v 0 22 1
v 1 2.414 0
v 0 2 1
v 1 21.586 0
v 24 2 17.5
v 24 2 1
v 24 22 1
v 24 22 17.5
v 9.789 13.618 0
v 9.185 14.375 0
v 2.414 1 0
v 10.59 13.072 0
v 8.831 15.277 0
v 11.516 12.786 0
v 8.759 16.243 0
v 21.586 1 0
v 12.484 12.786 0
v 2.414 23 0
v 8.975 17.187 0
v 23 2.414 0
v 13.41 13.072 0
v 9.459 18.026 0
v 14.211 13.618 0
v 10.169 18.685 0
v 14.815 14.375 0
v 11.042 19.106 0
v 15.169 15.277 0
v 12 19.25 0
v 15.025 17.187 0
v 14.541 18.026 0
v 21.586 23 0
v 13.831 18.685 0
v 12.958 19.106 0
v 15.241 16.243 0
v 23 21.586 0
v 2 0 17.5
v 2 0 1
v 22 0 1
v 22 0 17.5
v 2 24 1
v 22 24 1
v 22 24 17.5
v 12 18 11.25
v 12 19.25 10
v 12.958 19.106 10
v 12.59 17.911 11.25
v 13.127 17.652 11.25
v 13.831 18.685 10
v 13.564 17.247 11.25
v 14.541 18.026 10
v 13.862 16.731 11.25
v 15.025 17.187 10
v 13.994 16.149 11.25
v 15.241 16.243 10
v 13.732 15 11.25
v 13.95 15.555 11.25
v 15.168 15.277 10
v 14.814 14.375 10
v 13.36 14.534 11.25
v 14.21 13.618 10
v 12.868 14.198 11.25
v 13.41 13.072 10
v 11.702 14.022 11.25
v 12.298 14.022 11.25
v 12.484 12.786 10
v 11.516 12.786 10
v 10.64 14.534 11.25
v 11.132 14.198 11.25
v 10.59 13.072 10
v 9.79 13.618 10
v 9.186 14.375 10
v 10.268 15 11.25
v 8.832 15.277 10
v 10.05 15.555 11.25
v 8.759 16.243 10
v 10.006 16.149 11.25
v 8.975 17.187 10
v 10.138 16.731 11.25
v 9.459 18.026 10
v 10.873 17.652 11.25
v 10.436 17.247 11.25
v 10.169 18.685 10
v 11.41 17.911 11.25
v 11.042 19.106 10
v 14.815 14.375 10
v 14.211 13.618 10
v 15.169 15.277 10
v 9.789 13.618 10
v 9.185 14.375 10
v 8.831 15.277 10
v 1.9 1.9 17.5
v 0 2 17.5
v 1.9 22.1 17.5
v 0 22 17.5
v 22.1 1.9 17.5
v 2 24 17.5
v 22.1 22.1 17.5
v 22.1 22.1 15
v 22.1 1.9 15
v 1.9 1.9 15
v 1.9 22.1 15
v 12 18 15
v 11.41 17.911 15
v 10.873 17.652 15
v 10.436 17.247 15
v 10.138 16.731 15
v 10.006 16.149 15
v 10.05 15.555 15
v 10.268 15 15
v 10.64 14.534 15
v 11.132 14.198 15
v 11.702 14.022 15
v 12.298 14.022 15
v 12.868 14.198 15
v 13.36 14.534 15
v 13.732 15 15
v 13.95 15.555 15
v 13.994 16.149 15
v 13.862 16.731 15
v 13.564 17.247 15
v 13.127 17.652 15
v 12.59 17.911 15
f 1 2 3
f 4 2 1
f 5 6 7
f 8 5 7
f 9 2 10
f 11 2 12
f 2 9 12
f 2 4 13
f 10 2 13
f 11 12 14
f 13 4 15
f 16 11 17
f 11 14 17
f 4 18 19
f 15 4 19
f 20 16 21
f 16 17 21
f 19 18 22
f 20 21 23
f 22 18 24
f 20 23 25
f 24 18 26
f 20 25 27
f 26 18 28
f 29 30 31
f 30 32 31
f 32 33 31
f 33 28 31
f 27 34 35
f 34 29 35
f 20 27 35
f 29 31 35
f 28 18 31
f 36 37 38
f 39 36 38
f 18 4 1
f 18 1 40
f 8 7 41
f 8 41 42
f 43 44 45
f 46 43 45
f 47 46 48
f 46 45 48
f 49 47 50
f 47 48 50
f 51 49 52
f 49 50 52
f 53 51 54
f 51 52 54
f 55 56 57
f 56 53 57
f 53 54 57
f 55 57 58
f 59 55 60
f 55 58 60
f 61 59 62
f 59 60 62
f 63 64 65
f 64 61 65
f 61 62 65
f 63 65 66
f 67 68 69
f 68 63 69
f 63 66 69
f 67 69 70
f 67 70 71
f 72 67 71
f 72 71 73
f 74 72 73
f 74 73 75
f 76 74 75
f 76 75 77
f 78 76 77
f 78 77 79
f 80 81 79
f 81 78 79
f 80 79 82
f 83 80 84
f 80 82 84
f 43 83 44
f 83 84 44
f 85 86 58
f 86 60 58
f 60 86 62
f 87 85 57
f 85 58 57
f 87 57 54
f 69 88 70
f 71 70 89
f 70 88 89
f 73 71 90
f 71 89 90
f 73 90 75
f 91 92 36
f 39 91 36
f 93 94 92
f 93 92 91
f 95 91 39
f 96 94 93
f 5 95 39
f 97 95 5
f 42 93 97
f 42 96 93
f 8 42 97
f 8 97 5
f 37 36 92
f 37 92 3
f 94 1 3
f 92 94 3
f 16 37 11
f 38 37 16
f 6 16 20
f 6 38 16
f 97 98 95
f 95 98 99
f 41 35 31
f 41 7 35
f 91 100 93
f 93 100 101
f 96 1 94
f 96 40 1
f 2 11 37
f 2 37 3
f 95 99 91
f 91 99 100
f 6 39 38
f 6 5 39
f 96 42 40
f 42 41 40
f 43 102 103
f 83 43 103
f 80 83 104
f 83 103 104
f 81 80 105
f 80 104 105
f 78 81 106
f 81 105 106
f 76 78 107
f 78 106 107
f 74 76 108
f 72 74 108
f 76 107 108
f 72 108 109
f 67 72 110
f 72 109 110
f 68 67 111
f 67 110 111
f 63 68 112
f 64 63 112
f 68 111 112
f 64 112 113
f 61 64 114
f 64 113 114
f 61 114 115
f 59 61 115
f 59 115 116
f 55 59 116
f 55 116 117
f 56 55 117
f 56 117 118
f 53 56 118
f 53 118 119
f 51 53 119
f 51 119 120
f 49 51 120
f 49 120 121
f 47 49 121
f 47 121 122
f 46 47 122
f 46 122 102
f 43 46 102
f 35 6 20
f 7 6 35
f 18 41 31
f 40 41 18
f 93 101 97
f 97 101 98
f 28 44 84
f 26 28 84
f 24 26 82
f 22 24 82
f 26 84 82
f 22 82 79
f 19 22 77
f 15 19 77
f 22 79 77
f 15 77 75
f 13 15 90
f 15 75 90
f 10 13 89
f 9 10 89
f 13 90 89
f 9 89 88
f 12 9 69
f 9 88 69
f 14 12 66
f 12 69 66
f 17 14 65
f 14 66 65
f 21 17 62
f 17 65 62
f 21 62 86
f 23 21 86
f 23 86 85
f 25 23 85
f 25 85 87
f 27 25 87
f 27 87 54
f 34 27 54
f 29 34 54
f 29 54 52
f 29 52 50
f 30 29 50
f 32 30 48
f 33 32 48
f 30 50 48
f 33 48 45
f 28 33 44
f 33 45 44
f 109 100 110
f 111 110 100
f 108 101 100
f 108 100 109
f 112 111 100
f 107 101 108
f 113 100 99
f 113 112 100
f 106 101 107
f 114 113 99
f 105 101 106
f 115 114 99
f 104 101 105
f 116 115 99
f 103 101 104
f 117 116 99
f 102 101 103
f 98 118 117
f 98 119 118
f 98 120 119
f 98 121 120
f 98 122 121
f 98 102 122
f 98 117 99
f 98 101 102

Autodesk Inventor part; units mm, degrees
ref_plane "YZ Plane" through (0, 0, 0) normal (1, 0, 0) x (0, 1, 0)
ref_plane "XZ Plane" through (0, 0, 0) normal (0, 1, 0) x (-1, 0, 0)
ref_plane "XY Plane" through (0, 0, 0) normal (0, 0, 1) x (1, 0, 0)
sketch "Sketch1" plane through (0, 0, 0) normal (0, 0, 1) x (1, 0, 0)
  line L0 (0, 0) -> (24, 0)
  line L1 (24, 0) -> (24, 24)
  line L2 (24, 24) -> (0, 24)
  line L3 (0, 24) -> (0, 0)
  dimension "d0" = 24
  dimension "d1" = 24
extrude "Extrusion1" add sketch "Sketch1" along normal blind 15
sketch "Sketch2" plane through (0, 0, 15) normal (0, 0, 1) x (1, 0, 0)
  line L0 (24, 0) -> (24, 24) projected
  line L1 (24, 24) -> (0, 24) projected
  line L2 (0, 24) -> (0, 0) projected
  line L3 (0, 0) -> (24, 0) projected
  line L4 (2, 22) -> (22, 22)
  line L5 (22, 22) -> (22, 2)
  line L6 (22, 2) -> (2, 2)
  line L7 (2, 2) -> (2, 22)
  dimension "d4" = 2
extrude "Extrusion2" add sketch "Sketch2" along normal blind 2.5
chamfer "Chamfer1" distance 2 angle 45 4 edges at (0, 24, 8.75) (0, 0, 8.75) (24, 0, 8.75) (24, 24, 8.75)
sketch "Sketch3" plane through (0, 0, 0) normal (0, 0, -1) x (-1, 0, 0)
  line L0 (-2, 22) -> (-2, 2) projected
  line L1 (-2, 2) -> (-22, 2) projected
  line L2 (-22, 2) -> (-22, 22) projected
  line L3 (-22, 22) -> (-2, 22) projected
  point P0 (0, 0)
  point P1 (-12, 16)
  point P2 (-12, 22)
  dimension "d10" = 6
hole "Hole1" at (12, 16, 0) direction (0, 0, 1) diameter 4 depth 24 counterbore diameter 6.5 counterbore depth 10
chamfer "Chamfer2" distance 1 angle 45 8 edges at (12, 0, 0) (23, 1, 0) (24, 12, 0) (23, 23, 0) (12, 24, 0) (0, 12, 0) (1, 23, 0) (1, 1, 0)
thicken "Thicken1" operation add thickness 0.1 both sides no extend neighbours yes toward (1, 0, 0) faces at (22, 15.3333, 16.6667) (15.3333, 2, 16.6667) (2, 8.6667, 16.6667) (8.6667, 22, 15.8333)
chamfer "Chamfer3" distance 1.25 angle 45 1 edges at (12, 14, 10)
properties part number "Idle Side Foot"
